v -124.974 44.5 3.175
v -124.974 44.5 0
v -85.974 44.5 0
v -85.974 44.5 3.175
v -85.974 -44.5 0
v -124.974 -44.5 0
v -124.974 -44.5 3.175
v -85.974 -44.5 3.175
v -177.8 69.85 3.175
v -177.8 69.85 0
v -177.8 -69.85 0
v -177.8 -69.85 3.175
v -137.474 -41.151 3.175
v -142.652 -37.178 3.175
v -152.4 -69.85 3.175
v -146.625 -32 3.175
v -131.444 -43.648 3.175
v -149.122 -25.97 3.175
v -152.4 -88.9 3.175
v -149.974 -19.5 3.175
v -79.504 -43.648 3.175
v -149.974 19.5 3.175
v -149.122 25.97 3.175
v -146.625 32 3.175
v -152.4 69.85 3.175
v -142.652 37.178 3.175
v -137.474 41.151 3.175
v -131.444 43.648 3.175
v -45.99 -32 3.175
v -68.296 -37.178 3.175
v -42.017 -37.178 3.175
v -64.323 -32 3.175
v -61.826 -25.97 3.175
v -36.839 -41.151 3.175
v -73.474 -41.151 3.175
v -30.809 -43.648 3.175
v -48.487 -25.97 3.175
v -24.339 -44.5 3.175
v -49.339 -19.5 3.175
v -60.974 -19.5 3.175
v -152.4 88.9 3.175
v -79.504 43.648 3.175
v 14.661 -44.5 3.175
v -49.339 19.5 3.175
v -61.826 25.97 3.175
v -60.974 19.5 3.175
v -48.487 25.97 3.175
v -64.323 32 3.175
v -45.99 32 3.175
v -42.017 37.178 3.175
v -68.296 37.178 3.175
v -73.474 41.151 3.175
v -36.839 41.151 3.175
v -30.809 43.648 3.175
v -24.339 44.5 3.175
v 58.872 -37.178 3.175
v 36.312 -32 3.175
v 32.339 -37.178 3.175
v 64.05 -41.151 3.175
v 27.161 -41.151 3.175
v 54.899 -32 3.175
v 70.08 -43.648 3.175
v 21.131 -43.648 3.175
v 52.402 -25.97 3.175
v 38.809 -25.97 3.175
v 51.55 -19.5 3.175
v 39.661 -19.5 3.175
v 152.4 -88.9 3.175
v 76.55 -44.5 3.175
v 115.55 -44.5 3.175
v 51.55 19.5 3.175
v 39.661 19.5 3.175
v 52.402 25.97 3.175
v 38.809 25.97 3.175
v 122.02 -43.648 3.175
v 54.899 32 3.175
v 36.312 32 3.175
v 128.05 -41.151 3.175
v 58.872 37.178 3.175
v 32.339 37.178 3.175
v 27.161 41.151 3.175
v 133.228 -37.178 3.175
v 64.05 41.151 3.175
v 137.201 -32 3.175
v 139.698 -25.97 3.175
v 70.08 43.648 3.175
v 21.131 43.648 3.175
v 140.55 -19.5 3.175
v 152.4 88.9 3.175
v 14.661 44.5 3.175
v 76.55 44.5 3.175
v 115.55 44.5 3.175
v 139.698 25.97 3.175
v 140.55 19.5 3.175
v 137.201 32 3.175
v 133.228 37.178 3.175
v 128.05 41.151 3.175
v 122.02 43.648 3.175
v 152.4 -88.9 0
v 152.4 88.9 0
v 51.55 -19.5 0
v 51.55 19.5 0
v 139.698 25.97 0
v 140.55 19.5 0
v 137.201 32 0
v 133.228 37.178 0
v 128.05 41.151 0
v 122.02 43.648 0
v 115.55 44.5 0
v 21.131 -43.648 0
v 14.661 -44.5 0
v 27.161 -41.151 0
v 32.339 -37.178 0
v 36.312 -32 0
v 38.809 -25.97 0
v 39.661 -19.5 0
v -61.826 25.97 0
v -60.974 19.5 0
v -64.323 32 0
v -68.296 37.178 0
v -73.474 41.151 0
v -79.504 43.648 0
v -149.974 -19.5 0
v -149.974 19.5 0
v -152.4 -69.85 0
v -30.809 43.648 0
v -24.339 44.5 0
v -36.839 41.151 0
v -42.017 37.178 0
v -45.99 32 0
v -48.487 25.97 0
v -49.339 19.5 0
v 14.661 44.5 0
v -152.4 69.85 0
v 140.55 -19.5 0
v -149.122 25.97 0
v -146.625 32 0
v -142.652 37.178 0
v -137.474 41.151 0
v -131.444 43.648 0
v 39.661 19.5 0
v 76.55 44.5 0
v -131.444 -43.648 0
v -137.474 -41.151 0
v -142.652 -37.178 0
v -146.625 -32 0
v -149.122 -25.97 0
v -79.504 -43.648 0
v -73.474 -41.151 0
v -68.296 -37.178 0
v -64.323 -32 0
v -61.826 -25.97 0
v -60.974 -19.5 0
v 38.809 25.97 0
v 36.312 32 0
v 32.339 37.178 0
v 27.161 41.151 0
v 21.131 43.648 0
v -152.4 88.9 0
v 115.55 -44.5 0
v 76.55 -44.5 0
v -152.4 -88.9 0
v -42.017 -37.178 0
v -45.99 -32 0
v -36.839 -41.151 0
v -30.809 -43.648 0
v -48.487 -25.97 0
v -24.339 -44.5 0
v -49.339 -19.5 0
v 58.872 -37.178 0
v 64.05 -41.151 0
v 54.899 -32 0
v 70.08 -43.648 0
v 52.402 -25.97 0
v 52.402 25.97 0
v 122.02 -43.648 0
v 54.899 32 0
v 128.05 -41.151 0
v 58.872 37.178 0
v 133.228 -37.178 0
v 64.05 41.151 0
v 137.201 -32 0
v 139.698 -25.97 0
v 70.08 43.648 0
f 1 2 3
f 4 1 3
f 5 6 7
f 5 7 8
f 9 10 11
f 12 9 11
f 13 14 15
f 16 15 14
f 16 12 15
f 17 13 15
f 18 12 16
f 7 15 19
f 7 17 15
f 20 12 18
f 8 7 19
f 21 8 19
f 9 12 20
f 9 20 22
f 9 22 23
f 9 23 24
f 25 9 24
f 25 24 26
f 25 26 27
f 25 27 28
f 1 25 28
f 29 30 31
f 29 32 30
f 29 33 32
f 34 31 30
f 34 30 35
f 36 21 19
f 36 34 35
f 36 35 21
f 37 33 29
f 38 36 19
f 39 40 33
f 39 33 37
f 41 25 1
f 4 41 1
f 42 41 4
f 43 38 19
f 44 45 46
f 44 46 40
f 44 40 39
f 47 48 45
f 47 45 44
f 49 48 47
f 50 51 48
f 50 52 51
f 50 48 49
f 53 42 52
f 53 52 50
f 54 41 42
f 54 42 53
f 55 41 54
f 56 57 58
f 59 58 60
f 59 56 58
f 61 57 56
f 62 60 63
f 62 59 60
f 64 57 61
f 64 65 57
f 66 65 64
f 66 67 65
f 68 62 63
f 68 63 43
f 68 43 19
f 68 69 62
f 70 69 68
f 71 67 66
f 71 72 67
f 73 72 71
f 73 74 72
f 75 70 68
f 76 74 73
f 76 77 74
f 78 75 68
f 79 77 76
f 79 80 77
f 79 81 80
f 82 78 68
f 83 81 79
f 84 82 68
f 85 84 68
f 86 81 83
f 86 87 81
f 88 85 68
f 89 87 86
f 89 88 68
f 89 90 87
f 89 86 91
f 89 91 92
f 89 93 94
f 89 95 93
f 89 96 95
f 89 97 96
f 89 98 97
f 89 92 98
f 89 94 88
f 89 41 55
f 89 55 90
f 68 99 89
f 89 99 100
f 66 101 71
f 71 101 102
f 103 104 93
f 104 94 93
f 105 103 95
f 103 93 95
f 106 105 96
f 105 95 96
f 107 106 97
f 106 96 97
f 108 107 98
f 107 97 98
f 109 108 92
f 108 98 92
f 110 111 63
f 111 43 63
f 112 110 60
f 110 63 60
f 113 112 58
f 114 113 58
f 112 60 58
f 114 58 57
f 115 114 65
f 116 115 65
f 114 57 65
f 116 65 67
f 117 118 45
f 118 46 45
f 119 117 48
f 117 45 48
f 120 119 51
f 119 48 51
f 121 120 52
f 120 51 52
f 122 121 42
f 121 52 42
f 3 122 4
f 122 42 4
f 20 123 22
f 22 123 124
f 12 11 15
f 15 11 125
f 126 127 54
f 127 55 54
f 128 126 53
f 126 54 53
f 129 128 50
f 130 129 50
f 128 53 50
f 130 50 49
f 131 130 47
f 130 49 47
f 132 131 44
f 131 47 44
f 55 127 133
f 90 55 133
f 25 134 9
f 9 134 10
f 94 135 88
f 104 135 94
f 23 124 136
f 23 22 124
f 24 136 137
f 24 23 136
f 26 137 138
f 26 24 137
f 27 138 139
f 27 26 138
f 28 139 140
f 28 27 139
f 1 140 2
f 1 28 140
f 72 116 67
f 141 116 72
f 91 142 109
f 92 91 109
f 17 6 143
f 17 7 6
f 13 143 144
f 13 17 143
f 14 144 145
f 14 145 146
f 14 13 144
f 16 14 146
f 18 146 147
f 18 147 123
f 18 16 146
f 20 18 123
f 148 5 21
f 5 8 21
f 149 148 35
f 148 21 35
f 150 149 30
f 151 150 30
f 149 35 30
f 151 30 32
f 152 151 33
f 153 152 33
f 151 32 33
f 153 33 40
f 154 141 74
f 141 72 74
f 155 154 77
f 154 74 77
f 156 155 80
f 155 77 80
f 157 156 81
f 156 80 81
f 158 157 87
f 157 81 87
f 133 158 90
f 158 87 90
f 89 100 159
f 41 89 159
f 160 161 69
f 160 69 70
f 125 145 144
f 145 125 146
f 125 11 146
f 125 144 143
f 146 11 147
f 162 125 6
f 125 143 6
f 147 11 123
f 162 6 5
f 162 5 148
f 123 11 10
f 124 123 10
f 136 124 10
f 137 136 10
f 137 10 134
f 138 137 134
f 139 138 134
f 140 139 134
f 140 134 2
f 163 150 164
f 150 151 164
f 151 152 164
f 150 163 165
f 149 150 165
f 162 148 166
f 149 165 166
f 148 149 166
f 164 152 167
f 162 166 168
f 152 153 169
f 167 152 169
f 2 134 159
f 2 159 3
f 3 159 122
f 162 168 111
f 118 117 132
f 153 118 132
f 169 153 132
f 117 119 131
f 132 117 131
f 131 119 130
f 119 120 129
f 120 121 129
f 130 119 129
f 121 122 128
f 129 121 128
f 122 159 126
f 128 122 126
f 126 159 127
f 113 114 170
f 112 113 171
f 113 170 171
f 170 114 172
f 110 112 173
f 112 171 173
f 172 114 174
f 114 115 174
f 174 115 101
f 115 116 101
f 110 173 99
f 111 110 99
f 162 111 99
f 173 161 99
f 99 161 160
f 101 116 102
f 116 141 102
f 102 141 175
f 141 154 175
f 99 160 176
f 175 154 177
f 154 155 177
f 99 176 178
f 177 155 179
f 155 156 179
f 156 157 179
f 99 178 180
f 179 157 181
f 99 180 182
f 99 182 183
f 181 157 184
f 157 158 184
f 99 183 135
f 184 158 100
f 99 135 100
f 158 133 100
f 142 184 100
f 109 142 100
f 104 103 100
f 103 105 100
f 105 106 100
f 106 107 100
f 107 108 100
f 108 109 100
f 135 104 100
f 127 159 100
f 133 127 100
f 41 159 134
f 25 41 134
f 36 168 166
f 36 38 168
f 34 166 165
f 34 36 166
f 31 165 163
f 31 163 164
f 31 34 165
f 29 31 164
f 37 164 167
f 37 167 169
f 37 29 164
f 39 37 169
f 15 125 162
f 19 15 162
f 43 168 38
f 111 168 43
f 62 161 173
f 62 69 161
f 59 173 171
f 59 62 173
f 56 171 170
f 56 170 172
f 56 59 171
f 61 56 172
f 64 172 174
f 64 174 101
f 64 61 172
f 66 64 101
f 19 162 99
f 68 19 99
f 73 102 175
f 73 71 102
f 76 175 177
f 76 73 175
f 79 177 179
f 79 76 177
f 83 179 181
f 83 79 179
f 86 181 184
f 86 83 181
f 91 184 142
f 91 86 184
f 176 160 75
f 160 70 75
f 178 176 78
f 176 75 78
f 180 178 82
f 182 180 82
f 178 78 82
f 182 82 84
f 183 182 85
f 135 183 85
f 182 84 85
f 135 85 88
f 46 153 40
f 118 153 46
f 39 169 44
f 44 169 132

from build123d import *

# Parameters (mm, degrees)
SKETCH1_W           = 89
SKETCH1_H           = 89
BOSS_EXTRUDE1_DEPTH = 3.175
FILLET1_R           = 25


with BuildPart() as part:
    # Sketch1 → Boss-Extrude1 (new body)
    with BuildSketch(Plane.XY):
        Polygon((-152.4, 69.85), (-177.8, 69.85), (-177.8, -69.85), (-152.4, -69.85), (-152.4, -88.9), (152.4, -88.9), (152.4, 88.9), (-152.4, 88.9), align=None)
        with Locations((96.05, 0)):
            Rectangle(SKETCH1_W, SKETCH1_H, mode=Mode.SUBTRACT)
        with Locations((-105.474, 0)):
            Rectangle(SKETCH1_W, SKETCH1_H, mode=Mode.SUBTRACT)
        with Locations((-4.839, 0)):
            Rectangle(SKETCH1_W, SKETCH1_H, mode=Mode.SUBTRACT)
    extrude(amount=BOSS_EXTRUDE1_DEPTH)

    # Fillet1
    fillet1_edges = [part.edges().sort_by_distance(p)[0] for p in [
        (140.55, -44.5, 1.5875),
        (140.55, 44.5, 1.5875),
        (51.55, 44.5, 1.5875),
        (51.55, -44.5, 1.5875),
        (-149.974, 44.5, 1.5875),
        (-149.974, -44.5, 1.5875),
        (-60.974, -44.5, 1.5875),
        (-60.974, 44.5, 1.5875),
        (-49.339, 44.5, 1.5875),
        (-49.339, -44.5, 1.5875),
        (39.661, -44.5, 1.5875),
        (39.661, 44.5, 1.5875),
    ]]
    fillet(fillet1_edges, radius=FILLET1_R)


solid = part.part
